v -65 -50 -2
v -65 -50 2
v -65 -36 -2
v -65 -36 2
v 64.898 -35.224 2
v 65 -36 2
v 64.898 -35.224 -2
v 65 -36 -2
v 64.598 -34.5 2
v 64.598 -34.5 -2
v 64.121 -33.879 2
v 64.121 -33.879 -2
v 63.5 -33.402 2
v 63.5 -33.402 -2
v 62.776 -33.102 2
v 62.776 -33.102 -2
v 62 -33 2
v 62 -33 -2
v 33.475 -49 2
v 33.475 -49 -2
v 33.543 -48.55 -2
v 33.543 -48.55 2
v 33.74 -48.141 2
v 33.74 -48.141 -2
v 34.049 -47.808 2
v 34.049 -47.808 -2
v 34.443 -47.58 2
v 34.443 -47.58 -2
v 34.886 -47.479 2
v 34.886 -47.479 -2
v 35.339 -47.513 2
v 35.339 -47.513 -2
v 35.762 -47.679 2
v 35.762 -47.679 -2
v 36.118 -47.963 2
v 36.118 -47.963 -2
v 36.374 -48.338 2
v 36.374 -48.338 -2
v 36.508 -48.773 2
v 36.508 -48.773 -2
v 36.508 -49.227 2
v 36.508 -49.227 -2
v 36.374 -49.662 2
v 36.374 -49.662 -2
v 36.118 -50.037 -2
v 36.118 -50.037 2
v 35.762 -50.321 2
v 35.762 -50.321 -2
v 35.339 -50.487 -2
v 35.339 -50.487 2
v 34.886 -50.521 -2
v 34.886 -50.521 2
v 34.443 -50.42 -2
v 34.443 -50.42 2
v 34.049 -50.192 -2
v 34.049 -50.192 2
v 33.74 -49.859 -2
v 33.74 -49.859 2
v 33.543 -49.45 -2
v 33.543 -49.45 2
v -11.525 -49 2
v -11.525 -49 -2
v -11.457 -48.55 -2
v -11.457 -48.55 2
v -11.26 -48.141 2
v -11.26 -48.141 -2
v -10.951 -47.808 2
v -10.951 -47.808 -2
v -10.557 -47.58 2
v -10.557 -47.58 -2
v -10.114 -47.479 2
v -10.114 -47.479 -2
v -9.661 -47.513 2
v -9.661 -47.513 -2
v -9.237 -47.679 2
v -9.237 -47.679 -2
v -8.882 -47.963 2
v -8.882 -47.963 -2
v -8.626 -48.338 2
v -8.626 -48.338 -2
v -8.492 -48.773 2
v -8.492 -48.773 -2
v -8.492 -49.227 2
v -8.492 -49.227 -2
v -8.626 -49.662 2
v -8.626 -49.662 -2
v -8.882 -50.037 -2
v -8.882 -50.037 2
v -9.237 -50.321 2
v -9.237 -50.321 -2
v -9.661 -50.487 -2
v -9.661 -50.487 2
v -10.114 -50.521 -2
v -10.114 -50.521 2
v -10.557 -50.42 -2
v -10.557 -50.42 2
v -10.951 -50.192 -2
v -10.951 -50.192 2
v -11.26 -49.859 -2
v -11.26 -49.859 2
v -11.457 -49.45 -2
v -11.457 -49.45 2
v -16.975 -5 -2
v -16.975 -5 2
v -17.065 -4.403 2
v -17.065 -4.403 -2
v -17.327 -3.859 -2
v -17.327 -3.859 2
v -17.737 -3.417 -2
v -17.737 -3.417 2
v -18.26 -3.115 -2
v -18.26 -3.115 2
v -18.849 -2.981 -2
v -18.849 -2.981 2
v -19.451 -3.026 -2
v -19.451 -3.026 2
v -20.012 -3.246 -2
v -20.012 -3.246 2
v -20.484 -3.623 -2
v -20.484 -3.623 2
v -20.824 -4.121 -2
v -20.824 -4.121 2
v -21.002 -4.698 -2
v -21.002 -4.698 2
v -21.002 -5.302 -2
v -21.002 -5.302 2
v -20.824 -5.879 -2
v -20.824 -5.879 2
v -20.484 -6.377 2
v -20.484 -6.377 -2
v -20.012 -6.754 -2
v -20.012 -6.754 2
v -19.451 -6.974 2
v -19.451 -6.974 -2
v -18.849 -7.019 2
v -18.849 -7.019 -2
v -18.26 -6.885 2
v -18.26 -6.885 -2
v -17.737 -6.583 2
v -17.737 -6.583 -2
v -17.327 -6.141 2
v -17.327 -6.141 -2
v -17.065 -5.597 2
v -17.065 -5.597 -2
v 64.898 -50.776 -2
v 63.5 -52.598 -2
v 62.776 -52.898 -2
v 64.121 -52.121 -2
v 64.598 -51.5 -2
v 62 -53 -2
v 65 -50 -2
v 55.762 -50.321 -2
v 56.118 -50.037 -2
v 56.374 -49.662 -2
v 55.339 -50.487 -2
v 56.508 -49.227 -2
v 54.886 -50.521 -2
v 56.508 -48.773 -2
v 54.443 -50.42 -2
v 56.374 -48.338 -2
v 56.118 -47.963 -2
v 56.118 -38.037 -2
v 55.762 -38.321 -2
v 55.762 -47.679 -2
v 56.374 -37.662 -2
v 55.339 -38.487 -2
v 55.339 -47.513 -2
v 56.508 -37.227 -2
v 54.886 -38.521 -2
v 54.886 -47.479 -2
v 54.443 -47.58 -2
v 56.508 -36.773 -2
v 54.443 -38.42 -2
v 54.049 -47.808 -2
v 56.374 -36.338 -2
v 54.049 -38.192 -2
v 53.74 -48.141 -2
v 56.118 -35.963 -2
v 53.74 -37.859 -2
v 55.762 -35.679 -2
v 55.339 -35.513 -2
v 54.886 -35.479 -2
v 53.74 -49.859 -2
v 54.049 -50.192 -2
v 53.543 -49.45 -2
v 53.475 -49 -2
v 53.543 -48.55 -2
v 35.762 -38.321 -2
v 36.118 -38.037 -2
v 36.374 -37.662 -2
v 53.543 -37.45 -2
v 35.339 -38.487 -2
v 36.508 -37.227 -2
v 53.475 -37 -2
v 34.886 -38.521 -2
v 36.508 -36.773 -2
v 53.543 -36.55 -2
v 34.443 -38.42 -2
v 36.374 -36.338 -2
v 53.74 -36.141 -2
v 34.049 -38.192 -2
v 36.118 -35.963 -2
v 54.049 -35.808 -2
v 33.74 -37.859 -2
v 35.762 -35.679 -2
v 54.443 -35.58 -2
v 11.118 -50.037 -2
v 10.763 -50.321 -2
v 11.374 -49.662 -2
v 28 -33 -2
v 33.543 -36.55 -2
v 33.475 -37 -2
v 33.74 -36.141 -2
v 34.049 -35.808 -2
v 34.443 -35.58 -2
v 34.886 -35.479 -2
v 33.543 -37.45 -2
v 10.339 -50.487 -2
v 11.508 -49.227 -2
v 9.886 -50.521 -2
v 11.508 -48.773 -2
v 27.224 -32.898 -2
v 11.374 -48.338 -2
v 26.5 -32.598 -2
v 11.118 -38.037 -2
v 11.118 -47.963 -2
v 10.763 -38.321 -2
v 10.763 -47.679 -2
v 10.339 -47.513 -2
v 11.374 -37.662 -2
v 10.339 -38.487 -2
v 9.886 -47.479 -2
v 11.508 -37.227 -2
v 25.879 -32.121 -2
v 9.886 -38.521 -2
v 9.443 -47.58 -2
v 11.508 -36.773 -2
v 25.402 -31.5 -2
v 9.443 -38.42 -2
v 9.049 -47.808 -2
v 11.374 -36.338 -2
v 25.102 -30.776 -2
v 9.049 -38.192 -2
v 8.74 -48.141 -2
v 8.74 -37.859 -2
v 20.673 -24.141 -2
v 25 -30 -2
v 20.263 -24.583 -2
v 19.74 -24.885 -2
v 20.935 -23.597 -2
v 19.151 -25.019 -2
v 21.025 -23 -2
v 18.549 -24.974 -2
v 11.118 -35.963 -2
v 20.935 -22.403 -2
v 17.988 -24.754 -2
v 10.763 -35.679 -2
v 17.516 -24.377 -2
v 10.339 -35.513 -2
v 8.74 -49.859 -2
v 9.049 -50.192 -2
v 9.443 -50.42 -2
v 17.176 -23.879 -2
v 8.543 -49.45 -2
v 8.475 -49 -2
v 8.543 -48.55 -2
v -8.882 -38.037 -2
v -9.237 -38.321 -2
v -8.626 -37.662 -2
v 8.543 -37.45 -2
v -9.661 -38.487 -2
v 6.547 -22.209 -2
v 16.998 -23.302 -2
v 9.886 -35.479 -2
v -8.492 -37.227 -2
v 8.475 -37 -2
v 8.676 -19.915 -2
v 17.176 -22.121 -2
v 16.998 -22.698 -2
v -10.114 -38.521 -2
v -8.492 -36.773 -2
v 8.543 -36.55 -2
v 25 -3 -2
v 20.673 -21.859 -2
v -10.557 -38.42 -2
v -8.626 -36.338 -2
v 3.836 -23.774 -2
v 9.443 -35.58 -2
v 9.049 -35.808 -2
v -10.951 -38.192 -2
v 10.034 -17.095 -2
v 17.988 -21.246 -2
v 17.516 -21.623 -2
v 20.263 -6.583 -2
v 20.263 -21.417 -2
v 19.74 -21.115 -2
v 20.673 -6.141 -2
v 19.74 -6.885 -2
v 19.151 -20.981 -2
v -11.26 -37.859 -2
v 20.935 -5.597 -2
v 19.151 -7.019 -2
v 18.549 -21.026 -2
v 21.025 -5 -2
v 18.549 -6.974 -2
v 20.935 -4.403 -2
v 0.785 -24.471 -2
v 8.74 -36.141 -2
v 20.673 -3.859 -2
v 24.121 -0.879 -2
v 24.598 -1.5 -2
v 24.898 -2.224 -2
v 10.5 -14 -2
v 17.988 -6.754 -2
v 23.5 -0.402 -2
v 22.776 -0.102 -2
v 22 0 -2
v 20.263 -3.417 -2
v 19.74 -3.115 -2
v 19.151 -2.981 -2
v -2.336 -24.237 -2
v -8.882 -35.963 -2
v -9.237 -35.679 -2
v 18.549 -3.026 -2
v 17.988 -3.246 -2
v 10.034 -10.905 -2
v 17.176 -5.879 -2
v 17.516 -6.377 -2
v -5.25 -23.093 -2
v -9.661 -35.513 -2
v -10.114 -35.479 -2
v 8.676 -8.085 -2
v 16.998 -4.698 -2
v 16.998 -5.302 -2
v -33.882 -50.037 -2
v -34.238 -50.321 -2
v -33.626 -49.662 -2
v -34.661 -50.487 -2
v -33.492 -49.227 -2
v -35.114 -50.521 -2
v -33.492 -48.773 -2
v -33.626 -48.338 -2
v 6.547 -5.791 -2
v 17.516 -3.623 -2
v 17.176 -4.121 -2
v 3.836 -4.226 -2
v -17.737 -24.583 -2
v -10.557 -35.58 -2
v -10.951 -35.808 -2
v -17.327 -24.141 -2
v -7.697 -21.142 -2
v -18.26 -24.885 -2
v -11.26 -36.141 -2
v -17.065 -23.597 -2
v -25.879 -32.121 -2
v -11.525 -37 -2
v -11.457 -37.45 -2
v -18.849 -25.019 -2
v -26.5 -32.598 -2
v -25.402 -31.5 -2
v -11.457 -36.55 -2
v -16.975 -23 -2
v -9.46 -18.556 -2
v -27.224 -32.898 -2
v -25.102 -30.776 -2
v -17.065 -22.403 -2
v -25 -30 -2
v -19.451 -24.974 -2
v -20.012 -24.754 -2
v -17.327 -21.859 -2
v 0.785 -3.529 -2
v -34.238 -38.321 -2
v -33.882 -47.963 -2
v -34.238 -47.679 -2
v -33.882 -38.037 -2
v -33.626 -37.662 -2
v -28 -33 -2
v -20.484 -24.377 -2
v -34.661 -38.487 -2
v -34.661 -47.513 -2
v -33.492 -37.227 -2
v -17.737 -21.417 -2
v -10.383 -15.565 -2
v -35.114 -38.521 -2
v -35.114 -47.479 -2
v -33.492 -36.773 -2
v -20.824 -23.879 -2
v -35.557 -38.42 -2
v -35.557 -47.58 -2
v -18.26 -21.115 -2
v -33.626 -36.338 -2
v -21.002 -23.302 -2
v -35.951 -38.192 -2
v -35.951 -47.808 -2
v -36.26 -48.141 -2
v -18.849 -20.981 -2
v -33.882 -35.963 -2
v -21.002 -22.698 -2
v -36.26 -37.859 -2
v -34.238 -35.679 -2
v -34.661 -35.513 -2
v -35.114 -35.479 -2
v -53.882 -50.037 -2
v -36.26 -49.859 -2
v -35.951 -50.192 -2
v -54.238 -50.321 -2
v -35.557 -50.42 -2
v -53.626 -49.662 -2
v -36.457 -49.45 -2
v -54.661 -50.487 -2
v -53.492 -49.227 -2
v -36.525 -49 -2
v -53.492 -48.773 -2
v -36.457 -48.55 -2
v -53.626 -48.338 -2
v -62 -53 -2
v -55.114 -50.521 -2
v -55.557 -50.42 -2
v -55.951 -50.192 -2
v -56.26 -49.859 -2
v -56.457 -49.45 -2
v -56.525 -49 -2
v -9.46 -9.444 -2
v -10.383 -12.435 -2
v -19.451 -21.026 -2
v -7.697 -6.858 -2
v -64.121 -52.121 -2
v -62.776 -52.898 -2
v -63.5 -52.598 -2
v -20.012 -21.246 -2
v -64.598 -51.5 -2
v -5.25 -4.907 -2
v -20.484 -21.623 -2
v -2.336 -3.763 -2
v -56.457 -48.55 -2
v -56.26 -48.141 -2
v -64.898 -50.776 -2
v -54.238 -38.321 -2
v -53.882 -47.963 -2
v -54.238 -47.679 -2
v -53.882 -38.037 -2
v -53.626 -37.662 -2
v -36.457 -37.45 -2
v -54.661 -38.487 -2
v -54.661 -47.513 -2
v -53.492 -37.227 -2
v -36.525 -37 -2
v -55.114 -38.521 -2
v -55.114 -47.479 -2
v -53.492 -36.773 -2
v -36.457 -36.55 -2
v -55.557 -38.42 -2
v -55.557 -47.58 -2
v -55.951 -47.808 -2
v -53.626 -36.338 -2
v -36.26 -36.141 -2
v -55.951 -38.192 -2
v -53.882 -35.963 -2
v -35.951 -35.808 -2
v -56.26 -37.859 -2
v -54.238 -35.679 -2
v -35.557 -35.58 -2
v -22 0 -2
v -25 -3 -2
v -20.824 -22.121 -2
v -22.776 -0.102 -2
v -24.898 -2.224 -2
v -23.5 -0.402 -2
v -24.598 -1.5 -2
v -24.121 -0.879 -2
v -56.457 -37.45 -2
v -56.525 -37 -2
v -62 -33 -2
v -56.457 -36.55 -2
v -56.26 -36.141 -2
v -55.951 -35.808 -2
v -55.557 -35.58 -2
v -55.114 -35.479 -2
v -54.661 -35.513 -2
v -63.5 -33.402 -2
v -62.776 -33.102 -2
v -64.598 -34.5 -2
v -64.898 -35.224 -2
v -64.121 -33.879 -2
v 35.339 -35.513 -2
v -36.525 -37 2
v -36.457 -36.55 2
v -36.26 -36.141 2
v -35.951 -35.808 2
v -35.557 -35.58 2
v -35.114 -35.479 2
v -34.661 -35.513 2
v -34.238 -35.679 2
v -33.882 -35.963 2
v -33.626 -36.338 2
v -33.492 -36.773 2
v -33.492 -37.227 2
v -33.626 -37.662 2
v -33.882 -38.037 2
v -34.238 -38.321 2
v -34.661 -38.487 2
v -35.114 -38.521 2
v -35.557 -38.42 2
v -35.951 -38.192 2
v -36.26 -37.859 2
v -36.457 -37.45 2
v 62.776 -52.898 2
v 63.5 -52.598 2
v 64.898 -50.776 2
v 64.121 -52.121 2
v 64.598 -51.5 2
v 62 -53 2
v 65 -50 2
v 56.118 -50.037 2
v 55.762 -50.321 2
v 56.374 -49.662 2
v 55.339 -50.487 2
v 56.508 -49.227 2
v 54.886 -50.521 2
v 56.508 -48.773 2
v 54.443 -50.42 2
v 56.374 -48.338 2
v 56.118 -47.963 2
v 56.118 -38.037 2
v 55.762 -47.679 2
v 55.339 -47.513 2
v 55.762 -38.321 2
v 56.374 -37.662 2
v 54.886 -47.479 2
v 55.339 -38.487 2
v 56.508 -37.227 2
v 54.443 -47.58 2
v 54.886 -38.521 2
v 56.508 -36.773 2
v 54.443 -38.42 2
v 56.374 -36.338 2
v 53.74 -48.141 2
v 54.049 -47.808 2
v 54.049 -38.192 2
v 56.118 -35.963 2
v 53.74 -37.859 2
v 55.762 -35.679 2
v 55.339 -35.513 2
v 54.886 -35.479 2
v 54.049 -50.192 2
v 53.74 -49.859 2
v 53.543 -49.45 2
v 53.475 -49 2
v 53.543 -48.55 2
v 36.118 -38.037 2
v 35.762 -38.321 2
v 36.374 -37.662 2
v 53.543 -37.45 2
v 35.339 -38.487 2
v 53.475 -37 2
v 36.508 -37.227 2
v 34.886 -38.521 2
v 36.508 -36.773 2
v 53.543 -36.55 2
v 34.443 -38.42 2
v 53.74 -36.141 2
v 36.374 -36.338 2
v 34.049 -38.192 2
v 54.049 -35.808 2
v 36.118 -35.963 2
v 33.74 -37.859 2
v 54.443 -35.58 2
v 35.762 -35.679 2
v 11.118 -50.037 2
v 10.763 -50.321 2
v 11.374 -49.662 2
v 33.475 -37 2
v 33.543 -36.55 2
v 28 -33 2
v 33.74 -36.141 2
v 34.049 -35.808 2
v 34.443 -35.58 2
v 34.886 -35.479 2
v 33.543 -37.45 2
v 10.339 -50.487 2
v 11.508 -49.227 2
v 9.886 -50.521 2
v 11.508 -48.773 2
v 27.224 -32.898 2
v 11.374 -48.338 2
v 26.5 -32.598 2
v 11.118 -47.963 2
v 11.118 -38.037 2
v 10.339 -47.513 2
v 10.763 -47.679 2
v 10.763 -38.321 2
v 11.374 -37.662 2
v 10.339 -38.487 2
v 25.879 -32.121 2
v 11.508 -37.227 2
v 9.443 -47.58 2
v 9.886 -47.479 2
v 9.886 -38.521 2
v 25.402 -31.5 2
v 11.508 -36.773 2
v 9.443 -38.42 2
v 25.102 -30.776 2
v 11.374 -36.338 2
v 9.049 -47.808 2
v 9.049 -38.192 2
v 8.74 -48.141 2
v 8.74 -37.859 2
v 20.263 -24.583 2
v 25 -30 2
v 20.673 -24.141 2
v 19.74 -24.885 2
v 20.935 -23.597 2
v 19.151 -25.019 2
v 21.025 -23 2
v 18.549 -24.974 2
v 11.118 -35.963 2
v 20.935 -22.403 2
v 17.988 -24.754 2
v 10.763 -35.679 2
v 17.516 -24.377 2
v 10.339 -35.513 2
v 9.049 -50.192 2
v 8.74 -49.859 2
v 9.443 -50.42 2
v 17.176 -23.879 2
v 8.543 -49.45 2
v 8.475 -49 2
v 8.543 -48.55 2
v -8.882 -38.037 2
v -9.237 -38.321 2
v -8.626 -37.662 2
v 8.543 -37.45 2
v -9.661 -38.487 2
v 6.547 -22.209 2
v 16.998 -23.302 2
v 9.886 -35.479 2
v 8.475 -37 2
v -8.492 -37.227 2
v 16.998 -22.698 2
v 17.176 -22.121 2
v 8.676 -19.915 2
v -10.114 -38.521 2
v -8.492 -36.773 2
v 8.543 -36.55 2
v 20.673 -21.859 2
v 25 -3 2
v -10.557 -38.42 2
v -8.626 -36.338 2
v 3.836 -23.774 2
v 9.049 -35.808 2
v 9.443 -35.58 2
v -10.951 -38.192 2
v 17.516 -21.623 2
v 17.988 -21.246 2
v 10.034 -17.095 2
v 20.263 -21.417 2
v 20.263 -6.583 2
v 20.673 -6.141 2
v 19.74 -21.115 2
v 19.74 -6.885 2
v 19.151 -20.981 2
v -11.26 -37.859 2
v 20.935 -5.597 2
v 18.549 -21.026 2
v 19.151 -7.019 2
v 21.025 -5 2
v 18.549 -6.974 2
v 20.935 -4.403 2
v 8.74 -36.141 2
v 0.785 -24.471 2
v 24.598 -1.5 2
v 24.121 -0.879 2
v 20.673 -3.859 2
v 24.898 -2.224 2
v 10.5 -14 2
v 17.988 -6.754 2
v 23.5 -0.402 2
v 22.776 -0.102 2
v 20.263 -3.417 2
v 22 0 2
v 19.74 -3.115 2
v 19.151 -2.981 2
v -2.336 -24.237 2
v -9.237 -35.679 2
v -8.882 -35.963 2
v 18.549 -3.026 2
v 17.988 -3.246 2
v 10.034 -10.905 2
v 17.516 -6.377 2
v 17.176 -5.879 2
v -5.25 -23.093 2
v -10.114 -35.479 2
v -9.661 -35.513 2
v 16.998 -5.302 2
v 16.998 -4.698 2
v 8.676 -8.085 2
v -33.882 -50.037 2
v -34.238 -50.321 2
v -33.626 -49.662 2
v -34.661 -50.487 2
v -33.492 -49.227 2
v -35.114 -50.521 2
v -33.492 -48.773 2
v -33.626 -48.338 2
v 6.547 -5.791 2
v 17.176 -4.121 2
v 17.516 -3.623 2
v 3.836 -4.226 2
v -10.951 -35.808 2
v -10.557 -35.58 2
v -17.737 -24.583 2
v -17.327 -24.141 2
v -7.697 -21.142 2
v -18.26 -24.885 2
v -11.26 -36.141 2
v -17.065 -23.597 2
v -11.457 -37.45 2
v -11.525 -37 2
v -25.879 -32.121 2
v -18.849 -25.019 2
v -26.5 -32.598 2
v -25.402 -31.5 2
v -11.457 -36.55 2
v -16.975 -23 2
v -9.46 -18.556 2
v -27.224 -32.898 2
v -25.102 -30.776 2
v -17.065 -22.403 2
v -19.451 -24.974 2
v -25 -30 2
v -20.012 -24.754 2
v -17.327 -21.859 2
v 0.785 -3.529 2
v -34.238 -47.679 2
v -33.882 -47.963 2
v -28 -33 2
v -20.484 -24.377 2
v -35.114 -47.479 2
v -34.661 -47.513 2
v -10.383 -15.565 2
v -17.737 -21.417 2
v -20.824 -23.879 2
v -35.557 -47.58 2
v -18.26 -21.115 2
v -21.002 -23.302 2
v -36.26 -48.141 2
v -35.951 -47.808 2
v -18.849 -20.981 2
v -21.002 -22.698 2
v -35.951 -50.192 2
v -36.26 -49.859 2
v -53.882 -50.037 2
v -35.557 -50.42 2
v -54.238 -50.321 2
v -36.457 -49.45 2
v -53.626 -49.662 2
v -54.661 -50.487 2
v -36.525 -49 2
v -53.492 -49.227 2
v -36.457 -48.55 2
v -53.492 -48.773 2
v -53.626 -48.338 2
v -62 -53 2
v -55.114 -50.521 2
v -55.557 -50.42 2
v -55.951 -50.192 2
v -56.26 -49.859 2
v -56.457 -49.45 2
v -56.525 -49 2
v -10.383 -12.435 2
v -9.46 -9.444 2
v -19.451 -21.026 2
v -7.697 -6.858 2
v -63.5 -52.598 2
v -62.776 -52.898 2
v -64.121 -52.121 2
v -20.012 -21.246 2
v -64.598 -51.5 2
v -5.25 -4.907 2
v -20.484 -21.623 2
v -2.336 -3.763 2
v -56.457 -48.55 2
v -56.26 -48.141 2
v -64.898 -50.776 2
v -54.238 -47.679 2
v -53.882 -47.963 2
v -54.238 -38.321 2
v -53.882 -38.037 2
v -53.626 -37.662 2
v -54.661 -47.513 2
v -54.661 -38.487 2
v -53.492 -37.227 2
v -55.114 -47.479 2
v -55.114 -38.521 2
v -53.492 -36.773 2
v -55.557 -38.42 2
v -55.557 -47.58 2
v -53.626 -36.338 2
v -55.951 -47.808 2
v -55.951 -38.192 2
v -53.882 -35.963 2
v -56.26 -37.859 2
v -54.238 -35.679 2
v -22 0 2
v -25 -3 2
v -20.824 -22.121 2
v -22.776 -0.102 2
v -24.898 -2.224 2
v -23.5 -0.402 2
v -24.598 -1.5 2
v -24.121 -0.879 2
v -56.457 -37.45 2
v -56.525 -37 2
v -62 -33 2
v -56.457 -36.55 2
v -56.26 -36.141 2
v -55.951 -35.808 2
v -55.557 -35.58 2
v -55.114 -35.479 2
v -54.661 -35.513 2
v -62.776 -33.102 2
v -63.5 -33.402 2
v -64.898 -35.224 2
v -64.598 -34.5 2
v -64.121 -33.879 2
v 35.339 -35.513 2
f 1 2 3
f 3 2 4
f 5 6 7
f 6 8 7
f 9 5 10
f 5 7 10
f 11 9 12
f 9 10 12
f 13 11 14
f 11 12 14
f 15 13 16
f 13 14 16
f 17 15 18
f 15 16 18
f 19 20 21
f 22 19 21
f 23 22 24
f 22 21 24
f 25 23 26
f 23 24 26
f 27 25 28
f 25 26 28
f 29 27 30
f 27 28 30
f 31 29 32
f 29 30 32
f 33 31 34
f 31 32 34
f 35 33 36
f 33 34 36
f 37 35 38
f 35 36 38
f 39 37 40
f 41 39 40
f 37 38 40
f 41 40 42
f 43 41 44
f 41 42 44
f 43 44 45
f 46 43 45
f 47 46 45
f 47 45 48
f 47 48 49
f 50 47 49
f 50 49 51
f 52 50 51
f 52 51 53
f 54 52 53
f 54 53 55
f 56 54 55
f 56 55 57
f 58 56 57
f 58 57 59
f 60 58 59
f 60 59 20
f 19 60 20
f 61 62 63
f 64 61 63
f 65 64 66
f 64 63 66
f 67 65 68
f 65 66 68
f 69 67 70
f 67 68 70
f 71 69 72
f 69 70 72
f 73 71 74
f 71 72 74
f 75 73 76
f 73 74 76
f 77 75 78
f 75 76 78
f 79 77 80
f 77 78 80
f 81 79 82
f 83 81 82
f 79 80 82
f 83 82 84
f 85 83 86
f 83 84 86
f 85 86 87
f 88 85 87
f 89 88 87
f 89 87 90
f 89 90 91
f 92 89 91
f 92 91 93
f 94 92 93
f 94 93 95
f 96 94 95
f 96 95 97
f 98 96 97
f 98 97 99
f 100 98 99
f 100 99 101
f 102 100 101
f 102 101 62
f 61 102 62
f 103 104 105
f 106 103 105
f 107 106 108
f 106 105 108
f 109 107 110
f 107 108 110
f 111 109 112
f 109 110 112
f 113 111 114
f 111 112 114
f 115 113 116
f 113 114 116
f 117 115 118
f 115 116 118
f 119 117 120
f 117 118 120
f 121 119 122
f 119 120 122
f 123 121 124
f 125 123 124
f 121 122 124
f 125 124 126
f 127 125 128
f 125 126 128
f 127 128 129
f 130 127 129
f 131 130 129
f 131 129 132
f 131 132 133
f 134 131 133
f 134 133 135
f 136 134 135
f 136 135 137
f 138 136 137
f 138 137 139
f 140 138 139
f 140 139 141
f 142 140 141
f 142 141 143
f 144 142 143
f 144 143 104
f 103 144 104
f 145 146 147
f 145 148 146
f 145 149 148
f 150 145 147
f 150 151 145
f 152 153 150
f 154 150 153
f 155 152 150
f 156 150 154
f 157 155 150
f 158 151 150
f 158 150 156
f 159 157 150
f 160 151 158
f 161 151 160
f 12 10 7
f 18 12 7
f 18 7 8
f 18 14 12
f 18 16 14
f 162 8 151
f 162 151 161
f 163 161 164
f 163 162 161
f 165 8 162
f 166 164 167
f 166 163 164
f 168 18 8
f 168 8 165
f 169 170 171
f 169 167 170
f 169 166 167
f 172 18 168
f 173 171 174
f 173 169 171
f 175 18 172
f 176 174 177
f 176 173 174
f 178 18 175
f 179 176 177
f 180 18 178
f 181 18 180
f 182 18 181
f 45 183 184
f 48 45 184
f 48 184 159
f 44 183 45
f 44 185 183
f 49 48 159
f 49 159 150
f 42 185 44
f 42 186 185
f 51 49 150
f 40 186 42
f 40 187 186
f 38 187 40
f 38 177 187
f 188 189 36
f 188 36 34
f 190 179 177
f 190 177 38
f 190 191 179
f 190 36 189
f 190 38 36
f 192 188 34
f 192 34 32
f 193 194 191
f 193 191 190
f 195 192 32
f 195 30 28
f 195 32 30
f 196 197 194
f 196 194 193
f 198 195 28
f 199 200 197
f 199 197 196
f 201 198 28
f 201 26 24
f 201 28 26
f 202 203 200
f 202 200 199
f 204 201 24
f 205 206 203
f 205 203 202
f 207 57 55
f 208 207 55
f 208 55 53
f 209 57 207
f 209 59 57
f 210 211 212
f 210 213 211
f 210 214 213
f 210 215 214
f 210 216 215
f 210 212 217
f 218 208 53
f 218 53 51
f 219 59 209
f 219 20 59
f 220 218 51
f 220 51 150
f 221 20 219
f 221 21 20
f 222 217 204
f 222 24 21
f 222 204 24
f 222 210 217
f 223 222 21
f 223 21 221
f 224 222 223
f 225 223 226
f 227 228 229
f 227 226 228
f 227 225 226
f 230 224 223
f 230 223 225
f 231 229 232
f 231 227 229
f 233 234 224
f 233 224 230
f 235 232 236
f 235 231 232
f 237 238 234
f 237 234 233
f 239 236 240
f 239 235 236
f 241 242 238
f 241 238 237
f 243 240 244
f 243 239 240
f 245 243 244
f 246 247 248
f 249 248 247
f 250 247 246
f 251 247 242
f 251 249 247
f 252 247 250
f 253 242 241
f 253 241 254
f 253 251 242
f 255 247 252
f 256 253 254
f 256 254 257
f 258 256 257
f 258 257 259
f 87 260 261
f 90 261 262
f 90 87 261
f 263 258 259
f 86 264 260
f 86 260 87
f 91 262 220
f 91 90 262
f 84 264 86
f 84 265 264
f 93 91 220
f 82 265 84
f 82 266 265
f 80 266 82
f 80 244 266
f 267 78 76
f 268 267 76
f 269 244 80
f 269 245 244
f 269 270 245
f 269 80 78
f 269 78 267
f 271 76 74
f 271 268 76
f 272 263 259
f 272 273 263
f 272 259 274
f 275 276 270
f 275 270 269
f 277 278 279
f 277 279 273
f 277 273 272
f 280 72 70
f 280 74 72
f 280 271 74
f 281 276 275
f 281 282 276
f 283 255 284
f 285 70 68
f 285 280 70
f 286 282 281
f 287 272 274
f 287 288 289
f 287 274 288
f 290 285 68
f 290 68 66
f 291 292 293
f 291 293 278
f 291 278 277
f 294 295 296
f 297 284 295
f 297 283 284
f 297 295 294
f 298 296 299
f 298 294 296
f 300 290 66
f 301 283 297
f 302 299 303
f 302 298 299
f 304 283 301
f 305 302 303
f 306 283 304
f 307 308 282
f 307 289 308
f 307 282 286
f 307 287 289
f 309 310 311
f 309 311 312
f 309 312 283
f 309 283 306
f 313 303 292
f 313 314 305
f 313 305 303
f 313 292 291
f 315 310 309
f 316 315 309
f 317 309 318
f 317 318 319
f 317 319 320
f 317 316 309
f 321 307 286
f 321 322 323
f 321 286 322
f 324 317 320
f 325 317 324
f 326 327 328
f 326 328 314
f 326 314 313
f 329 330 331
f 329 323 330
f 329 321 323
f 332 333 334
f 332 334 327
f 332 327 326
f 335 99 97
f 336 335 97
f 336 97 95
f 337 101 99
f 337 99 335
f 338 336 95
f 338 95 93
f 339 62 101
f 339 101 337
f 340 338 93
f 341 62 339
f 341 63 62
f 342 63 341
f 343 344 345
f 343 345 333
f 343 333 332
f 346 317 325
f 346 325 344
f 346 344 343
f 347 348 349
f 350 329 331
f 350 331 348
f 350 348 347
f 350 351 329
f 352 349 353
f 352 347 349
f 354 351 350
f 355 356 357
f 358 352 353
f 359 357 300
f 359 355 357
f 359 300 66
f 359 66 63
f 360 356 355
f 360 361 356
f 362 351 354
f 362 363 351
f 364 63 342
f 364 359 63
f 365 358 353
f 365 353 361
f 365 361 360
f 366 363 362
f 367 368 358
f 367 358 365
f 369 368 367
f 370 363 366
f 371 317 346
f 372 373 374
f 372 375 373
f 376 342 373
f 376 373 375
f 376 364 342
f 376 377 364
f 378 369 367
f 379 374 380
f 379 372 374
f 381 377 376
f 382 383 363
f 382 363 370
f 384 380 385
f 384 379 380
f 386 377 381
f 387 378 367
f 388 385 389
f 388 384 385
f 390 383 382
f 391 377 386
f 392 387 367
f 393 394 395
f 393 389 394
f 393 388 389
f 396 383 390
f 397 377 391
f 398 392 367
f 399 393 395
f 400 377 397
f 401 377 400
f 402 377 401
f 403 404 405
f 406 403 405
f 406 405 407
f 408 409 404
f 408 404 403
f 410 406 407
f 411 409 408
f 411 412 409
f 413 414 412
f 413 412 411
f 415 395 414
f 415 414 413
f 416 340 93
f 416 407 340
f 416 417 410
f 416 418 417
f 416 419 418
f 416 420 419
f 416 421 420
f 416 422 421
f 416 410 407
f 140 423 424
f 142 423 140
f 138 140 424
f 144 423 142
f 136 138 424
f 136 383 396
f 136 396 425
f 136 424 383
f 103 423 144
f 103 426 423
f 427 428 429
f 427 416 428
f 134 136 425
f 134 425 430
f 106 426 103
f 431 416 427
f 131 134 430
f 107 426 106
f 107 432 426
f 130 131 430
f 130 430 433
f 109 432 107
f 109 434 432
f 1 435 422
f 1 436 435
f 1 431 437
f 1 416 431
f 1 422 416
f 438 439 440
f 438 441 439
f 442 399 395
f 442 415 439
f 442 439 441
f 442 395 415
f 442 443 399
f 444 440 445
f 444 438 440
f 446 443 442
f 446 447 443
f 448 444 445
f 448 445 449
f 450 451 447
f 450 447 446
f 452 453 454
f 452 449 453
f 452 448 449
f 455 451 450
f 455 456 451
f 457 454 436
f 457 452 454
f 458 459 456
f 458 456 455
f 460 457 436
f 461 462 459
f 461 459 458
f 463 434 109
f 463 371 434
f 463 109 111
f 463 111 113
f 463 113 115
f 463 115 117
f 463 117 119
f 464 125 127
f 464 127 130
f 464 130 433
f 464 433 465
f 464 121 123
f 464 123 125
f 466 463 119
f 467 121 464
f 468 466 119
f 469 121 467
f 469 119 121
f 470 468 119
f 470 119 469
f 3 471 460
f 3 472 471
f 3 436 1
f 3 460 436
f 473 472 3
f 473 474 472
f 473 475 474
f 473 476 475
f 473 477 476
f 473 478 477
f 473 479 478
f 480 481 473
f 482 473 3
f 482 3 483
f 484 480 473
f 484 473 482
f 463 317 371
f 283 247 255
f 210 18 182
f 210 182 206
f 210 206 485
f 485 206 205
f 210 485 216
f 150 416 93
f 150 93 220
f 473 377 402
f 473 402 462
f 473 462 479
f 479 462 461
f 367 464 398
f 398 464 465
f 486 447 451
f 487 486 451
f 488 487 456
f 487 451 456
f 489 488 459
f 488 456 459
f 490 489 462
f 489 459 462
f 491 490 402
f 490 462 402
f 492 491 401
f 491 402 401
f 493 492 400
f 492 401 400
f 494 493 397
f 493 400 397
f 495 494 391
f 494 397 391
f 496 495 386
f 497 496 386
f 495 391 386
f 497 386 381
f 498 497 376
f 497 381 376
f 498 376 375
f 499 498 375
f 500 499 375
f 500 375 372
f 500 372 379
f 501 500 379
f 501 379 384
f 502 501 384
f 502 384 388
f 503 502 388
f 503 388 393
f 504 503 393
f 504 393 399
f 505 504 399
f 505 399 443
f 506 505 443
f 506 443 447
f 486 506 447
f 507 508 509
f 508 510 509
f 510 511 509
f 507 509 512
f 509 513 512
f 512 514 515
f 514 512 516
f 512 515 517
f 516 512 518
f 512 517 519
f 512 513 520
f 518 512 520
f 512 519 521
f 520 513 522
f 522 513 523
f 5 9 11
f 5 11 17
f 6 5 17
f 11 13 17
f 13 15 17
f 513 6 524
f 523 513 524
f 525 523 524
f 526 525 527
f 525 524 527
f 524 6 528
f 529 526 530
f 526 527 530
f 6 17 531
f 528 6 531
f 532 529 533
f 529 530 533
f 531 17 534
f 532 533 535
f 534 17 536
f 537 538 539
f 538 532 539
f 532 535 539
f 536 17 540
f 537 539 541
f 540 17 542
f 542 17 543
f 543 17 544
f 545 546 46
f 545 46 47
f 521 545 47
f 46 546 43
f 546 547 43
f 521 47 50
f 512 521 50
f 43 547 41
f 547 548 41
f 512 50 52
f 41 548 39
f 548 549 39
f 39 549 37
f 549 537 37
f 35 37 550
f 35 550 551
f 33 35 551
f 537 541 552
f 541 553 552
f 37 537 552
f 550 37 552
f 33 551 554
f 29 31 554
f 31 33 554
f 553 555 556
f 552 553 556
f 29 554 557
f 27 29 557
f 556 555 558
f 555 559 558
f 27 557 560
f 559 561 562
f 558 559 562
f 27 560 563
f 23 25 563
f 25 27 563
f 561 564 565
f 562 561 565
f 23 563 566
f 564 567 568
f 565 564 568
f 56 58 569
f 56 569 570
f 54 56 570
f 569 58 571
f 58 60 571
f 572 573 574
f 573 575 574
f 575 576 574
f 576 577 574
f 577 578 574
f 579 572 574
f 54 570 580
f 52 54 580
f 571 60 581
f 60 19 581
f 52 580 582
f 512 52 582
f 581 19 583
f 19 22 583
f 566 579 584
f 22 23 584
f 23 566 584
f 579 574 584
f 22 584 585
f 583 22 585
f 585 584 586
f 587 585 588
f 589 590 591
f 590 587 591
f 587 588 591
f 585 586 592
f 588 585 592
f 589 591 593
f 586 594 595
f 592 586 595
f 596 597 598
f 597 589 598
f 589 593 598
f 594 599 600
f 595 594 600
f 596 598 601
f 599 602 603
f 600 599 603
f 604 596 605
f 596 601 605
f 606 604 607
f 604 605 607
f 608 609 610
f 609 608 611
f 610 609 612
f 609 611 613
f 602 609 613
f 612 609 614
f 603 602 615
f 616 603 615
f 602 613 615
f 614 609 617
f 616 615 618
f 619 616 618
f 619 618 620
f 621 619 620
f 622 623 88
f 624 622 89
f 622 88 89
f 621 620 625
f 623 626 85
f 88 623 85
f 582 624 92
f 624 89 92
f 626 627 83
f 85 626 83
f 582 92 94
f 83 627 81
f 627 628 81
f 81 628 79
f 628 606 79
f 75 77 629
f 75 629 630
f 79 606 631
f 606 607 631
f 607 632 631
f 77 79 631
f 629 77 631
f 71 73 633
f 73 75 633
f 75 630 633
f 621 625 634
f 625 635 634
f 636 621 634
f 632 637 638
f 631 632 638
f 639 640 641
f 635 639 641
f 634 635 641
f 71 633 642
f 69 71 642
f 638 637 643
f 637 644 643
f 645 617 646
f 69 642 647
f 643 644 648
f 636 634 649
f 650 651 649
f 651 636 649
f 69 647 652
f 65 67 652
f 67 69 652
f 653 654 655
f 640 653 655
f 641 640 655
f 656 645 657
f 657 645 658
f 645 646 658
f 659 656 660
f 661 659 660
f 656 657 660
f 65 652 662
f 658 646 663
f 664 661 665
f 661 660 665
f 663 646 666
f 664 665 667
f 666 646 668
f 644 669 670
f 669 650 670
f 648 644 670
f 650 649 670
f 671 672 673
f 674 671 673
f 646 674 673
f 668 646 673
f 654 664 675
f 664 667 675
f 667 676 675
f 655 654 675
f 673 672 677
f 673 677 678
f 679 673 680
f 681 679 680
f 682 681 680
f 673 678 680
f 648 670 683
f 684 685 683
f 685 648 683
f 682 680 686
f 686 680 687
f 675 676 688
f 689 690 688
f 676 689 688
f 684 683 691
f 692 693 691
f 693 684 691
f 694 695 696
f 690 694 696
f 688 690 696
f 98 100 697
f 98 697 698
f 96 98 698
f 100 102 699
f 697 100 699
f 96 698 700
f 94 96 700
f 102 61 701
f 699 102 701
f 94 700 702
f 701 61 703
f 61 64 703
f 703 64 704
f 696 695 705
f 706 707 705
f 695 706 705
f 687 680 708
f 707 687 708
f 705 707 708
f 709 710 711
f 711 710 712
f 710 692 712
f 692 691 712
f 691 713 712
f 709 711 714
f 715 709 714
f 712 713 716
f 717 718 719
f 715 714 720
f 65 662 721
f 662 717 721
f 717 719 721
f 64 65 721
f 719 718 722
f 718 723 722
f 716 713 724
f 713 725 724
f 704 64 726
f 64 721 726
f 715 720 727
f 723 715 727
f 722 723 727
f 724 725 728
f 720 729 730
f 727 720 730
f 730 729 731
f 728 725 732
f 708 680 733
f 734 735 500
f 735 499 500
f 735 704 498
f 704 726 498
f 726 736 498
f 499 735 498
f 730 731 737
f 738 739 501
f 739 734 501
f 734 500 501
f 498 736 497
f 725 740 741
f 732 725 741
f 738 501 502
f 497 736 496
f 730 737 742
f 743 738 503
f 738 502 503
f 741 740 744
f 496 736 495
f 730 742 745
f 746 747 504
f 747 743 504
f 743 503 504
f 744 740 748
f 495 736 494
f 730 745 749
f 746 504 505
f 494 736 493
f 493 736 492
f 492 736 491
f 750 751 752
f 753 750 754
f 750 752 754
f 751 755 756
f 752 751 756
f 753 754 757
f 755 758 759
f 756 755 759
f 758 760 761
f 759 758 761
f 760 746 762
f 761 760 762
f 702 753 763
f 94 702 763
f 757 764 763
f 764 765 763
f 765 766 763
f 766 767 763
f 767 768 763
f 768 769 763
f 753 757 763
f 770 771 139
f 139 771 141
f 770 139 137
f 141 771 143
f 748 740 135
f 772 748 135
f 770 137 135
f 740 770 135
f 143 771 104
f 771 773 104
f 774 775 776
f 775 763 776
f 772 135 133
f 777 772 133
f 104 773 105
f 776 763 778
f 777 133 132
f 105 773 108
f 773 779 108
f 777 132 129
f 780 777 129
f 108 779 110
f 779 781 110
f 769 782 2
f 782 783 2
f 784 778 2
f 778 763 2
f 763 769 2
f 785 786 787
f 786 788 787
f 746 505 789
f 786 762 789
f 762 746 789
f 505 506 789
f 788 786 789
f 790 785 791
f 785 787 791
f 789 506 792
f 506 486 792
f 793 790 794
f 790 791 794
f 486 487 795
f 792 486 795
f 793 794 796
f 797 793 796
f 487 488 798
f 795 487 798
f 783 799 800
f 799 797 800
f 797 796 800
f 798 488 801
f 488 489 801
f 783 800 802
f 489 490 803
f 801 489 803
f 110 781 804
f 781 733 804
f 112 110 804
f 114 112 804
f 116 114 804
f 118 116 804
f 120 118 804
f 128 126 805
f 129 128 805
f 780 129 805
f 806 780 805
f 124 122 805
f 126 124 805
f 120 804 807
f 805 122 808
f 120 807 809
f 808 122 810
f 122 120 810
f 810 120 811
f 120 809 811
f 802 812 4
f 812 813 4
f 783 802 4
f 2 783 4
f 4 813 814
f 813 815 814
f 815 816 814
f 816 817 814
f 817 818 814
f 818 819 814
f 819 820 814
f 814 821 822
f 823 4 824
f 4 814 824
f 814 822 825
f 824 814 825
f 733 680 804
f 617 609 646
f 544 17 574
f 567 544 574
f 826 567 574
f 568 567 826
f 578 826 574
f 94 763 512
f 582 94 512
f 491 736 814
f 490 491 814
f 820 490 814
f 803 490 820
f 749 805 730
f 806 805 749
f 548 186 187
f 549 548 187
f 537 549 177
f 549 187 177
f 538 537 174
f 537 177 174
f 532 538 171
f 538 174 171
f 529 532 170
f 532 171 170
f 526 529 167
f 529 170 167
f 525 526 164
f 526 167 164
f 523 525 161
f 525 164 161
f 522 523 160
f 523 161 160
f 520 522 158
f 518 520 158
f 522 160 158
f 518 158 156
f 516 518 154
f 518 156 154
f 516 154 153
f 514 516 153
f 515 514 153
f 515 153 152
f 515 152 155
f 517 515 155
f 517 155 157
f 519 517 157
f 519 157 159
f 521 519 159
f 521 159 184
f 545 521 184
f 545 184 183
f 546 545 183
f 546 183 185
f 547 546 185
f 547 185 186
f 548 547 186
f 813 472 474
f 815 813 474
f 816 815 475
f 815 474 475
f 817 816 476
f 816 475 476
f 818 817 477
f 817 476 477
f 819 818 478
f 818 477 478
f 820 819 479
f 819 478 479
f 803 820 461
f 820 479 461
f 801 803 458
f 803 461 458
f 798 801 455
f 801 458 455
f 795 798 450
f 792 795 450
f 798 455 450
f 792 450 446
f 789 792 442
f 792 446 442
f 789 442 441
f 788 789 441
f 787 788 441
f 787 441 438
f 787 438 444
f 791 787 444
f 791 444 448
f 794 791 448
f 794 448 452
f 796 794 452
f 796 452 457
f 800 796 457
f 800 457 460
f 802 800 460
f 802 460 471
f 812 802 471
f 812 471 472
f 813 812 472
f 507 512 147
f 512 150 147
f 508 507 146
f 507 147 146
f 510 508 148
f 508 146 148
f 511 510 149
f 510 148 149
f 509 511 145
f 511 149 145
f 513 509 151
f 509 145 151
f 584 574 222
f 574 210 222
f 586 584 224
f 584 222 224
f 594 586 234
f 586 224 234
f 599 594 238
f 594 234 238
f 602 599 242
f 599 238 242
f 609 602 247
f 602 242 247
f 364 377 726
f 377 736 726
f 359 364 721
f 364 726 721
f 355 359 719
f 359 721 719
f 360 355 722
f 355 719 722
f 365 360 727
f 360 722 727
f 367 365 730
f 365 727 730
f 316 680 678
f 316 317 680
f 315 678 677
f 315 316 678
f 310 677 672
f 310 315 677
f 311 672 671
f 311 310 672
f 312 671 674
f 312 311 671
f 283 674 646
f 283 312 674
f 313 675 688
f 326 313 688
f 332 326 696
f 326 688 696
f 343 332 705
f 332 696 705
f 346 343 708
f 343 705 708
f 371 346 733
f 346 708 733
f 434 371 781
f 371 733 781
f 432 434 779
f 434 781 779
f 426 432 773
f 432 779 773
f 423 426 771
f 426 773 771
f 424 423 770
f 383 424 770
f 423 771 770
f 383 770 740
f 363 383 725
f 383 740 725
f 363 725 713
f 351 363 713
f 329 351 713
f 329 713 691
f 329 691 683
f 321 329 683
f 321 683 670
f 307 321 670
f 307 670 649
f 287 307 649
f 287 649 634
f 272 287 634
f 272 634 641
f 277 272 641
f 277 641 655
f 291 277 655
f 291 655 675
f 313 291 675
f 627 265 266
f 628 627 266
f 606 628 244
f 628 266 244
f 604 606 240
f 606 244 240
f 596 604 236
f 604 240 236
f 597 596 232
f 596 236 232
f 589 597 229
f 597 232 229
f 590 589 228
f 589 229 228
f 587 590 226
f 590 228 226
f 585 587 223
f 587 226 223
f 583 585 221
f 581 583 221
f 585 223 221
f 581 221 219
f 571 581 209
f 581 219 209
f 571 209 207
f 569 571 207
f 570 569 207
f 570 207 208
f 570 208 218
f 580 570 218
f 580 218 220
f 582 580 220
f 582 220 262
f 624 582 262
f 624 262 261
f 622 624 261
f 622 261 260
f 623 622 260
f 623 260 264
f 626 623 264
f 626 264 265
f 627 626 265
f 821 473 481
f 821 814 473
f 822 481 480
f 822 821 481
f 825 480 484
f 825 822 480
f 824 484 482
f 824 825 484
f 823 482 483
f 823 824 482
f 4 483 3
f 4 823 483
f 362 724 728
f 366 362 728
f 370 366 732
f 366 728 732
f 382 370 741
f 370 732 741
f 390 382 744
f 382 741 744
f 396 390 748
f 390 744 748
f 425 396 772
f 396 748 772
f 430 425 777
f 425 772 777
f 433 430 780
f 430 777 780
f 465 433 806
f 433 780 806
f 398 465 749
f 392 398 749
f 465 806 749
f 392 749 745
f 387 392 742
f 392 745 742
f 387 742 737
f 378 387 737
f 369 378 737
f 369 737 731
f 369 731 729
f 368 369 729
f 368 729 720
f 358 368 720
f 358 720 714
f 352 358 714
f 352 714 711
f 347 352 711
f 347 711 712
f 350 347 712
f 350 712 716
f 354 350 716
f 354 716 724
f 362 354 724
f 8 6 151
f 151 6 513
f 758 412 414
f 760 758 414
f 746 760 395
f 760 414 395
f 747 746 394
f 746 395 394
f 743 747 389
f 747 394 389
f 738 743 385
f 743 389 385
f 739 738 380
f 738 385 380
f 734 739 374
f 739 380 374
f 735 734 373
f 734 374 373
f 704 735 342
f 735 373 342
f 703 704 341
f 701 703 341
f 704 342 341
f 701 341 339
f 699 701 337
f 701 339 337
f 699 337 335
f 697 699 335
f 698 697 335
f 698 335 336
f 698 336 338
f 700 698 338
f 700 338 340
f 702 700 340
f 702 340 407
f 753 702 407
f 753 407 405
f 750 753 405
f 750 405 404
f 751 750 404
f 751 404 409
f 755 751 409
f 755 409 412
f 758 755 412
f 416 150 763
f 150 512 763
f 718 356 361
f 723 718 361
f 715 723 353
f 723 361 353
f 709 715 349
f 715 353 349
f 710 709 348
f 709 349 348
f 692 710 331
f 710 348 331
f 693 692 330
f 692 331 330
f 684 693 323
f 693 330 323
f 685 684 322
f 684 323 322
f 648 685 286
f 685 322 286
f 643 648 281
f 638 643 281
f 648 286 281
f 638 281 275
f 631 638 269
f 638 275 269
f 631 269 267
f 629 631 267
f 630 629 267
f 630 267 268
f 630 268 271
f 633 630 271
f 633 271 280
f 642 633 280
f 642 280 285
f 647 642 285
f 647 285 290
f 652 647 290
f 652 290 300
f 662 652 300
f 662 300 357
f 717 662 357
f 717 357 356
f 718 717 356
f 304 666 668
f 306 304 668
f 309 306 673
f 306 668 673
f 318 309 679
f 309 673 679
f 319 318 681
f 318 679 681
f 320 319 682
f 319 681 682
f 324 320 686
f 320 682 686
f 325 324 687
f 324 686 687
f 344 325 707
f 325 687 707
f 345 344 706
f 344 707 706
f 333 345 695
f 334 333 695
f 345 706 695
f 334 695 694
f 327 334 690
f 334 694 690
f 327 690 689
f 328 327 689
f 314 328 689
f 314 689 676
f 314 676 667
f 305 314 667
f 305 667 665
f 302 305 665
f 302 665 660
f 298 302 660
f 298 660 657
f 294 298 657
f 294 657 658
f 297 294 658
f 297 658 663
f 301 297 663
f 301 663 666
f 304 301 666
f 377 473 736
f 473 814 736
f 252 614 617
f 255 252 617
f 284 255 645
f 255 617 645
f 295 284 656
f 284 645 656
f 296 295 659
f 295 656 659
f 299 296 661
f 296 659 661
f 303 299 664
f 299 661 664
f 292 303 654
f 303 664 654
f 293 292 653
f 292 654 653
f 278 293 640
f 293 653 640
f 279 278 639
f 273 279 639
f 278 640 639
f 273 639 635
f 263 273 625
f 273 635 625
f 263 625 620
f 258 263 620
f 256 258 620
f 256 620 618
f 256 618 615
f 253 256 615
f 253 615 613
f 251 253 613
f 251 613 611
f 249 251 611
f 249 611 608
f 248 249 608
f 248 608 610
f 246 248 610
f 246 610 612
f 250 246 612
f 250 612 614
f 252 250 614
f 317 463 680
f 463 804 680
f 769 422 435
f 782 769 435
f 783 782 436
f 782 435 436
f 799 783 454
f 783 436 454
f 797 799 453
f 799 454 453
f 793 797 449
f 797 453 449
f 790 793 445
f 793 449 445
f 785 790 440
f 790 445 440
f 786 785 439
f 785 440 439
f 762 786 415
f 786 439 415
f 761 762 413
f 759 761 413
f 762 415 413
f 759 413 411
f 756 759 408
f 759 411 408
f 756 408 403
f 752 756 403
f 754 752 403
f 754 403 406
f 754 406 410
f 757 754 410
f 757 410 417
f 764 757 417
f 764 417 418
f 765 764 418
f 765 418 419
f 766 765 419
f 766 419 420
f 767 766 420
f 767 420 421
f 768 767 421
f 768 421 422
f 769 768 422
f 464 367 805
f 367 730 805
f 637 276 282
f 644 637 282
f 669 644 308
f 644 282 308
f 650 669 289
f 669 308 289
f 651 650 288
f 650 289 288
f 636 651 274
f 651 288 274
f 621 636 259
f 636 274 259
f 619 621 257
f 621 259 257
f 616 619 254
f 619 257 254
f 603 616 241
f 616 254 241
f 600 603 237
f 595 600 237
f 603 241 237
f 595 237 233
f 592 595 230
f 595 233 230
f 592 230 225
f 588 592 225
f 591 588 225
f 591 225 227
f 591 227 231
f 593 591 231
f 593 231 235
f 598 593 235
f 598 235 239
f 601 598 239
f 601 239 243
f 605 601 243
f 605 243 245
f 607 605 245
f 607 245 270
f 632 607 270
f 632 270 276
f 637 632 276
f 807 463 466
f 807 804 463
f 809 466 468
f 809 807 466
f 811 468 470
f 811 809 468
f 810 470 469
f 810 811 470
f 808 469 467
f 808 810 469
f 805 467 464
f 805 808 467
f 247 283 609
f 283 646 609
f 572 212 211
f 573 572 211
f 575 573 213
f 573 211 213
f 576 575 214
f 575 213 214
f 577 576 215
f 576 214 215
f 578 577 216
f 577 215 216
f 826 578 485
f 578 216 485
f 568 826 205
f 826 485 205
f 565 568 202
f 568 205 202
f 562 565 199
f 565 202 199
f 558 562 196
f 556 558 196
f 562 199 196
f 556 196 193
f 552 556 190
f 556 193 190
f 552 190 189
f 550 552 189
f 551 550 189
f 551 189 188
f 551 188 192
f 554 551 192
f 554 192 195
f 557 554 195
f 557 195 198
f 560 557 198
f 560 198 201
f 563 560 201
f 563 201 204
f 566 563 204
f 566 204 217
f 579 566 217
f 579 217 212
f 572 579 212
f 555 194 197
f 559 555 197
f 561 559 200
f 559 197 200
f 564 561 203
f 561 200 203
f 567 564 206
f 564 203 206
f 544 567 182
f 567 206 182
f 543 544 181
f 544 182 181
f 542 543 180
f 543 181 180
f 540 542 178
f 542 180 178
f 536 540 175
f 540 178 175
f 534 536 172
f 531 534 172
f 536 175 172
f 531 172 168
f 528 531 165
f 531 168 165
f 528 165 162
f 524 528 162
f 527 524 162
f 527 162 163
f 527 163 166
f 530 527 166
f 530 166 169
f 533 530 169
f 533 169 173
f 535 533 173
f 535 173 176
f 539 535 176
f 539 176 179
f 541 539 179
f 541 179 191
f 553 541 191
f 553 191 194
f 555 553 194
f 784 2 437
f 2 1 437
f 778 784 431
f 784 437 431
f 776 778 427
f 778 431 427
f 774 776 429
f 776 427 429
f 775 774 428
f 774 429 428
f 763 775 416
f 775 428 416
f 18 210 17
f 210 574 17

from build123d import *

# Parameters (mm, degrees)
EXTRUDE_1_DEPTH          = 2
FILLET_1_R               = 3
SKETCH_2_R               = 2.025
CUT_EXTRUDE_1_DEPTH      = 1
CUT_EXTRUDE_1_DEPTH_BACK = 5
SKETCH_3_R               = 1.525
CUT_EXTRUDE_2_DEPTH      = 10
SKETCH_4_R               = 10.5
CUT_EXTRUDE_3_DEPTH      = 5


with BuildPart() as part:
    # 草图1 → 凸台-拉伸1 (new body, symmetric)
    with BuildSketch(Plane.XY):
        Polygon((-25, 0), (25, 0), (25, -33), (65, -33), (65, -53), (-65, -53), (-65, -33), (-25, -33), align=None)
    extrude(amount=EXTRUDE_1_DEPTH, both=True)

    # 圆角1
    fillet_1_edges = [part.edges().sort_by_distance(p)[0] for p in [
        (-25, 0, 0),
        (25, 0, 0),
        (25, -33, 0),
        (65, -33, 0),
        (65, -53, 0),
        (-65, -53, 0),
        (-65, -33, 0),
        (-25, -33, 0),
    ]]
    fillet(fillet_1_edges, radius=FILLET_1_R)

    # 草图2 → 切除-拉伸1 (cut, two sides)
    with BuildSketch(Plane.XY.offset(2)) as cut_extrude_1_sk:
        with Locations((-19, -5)):
            Circle(SKETCH_2_R)
        with Locations((-19, -23)):
            Circle(SKETCH_2_R)
        with Locations((19, -5)):
            Circle(SKETCH_2_R)
        with Locations((19, -23)):
            Circle(SKETCH_2_R)
    extrude(amount=CUT_EXTRUDE_1_DEPTH, mode=Mode.SUBTRACT)
    extrude(cut_extrude_1_sk.sketch, amount=-CUT_EXTRUDE_1_DEPTH_BACK, mode=Mode.SUBTRACT)

    # 草图3 → 切除-拉伸2 (cut)
    with BuildSketch(Plane(origin=(0, 0, -2), x_dir=(-1, 0, 0), z_dir=(0, 0, -1))):
        with Locations((-55, -49)):
            Circle(SKETCH_3_R)
        with Locations((-35, -49)):
            Circle(SKETCH_3_R)
        with Locations((-10, -49)):
            Circle(SKETCH_3_R)
        with Locations((10, -49)):
            Circle(SKETCH_3_R)
        with Locations((35, -49)):
            Circle(SKETCH_3_R)
        with Locations((55, -49)):
            Circle(SKETCH_3_R)
        with Locations((55, -37)):
            Circle(SKETCH_3_R)
        with Locations((35, -37)):
            Circle(SKETCH_3_R)
        with Locations((10, -37)):
            Circle(SKETCH_3_R)
        with Locations((-10, -37)):
            Circle(SKETCH_3_R)
        with Locations((-35, -37)):
            Circle(SKETCH_3_R)
        with Locations((-55, -37)):
            Circle(SKETCH_3_R)
    extrude(amount=-CUT_EXTRUDE_2_DEPTH, mode=Mode.SUBTRACT)

    # 草图4 → 切除-拉伸3 (cut, through all)
    with BuildSketch(Plane.XY.offset(2)):
        with Locations((0, -14)):
            Circle(SKETCH_4_R)
    extrude(amount=-CUT_EXTRUDE_3_DEPTH, mode=Mode.SUBTRACT)


solid = part.part
